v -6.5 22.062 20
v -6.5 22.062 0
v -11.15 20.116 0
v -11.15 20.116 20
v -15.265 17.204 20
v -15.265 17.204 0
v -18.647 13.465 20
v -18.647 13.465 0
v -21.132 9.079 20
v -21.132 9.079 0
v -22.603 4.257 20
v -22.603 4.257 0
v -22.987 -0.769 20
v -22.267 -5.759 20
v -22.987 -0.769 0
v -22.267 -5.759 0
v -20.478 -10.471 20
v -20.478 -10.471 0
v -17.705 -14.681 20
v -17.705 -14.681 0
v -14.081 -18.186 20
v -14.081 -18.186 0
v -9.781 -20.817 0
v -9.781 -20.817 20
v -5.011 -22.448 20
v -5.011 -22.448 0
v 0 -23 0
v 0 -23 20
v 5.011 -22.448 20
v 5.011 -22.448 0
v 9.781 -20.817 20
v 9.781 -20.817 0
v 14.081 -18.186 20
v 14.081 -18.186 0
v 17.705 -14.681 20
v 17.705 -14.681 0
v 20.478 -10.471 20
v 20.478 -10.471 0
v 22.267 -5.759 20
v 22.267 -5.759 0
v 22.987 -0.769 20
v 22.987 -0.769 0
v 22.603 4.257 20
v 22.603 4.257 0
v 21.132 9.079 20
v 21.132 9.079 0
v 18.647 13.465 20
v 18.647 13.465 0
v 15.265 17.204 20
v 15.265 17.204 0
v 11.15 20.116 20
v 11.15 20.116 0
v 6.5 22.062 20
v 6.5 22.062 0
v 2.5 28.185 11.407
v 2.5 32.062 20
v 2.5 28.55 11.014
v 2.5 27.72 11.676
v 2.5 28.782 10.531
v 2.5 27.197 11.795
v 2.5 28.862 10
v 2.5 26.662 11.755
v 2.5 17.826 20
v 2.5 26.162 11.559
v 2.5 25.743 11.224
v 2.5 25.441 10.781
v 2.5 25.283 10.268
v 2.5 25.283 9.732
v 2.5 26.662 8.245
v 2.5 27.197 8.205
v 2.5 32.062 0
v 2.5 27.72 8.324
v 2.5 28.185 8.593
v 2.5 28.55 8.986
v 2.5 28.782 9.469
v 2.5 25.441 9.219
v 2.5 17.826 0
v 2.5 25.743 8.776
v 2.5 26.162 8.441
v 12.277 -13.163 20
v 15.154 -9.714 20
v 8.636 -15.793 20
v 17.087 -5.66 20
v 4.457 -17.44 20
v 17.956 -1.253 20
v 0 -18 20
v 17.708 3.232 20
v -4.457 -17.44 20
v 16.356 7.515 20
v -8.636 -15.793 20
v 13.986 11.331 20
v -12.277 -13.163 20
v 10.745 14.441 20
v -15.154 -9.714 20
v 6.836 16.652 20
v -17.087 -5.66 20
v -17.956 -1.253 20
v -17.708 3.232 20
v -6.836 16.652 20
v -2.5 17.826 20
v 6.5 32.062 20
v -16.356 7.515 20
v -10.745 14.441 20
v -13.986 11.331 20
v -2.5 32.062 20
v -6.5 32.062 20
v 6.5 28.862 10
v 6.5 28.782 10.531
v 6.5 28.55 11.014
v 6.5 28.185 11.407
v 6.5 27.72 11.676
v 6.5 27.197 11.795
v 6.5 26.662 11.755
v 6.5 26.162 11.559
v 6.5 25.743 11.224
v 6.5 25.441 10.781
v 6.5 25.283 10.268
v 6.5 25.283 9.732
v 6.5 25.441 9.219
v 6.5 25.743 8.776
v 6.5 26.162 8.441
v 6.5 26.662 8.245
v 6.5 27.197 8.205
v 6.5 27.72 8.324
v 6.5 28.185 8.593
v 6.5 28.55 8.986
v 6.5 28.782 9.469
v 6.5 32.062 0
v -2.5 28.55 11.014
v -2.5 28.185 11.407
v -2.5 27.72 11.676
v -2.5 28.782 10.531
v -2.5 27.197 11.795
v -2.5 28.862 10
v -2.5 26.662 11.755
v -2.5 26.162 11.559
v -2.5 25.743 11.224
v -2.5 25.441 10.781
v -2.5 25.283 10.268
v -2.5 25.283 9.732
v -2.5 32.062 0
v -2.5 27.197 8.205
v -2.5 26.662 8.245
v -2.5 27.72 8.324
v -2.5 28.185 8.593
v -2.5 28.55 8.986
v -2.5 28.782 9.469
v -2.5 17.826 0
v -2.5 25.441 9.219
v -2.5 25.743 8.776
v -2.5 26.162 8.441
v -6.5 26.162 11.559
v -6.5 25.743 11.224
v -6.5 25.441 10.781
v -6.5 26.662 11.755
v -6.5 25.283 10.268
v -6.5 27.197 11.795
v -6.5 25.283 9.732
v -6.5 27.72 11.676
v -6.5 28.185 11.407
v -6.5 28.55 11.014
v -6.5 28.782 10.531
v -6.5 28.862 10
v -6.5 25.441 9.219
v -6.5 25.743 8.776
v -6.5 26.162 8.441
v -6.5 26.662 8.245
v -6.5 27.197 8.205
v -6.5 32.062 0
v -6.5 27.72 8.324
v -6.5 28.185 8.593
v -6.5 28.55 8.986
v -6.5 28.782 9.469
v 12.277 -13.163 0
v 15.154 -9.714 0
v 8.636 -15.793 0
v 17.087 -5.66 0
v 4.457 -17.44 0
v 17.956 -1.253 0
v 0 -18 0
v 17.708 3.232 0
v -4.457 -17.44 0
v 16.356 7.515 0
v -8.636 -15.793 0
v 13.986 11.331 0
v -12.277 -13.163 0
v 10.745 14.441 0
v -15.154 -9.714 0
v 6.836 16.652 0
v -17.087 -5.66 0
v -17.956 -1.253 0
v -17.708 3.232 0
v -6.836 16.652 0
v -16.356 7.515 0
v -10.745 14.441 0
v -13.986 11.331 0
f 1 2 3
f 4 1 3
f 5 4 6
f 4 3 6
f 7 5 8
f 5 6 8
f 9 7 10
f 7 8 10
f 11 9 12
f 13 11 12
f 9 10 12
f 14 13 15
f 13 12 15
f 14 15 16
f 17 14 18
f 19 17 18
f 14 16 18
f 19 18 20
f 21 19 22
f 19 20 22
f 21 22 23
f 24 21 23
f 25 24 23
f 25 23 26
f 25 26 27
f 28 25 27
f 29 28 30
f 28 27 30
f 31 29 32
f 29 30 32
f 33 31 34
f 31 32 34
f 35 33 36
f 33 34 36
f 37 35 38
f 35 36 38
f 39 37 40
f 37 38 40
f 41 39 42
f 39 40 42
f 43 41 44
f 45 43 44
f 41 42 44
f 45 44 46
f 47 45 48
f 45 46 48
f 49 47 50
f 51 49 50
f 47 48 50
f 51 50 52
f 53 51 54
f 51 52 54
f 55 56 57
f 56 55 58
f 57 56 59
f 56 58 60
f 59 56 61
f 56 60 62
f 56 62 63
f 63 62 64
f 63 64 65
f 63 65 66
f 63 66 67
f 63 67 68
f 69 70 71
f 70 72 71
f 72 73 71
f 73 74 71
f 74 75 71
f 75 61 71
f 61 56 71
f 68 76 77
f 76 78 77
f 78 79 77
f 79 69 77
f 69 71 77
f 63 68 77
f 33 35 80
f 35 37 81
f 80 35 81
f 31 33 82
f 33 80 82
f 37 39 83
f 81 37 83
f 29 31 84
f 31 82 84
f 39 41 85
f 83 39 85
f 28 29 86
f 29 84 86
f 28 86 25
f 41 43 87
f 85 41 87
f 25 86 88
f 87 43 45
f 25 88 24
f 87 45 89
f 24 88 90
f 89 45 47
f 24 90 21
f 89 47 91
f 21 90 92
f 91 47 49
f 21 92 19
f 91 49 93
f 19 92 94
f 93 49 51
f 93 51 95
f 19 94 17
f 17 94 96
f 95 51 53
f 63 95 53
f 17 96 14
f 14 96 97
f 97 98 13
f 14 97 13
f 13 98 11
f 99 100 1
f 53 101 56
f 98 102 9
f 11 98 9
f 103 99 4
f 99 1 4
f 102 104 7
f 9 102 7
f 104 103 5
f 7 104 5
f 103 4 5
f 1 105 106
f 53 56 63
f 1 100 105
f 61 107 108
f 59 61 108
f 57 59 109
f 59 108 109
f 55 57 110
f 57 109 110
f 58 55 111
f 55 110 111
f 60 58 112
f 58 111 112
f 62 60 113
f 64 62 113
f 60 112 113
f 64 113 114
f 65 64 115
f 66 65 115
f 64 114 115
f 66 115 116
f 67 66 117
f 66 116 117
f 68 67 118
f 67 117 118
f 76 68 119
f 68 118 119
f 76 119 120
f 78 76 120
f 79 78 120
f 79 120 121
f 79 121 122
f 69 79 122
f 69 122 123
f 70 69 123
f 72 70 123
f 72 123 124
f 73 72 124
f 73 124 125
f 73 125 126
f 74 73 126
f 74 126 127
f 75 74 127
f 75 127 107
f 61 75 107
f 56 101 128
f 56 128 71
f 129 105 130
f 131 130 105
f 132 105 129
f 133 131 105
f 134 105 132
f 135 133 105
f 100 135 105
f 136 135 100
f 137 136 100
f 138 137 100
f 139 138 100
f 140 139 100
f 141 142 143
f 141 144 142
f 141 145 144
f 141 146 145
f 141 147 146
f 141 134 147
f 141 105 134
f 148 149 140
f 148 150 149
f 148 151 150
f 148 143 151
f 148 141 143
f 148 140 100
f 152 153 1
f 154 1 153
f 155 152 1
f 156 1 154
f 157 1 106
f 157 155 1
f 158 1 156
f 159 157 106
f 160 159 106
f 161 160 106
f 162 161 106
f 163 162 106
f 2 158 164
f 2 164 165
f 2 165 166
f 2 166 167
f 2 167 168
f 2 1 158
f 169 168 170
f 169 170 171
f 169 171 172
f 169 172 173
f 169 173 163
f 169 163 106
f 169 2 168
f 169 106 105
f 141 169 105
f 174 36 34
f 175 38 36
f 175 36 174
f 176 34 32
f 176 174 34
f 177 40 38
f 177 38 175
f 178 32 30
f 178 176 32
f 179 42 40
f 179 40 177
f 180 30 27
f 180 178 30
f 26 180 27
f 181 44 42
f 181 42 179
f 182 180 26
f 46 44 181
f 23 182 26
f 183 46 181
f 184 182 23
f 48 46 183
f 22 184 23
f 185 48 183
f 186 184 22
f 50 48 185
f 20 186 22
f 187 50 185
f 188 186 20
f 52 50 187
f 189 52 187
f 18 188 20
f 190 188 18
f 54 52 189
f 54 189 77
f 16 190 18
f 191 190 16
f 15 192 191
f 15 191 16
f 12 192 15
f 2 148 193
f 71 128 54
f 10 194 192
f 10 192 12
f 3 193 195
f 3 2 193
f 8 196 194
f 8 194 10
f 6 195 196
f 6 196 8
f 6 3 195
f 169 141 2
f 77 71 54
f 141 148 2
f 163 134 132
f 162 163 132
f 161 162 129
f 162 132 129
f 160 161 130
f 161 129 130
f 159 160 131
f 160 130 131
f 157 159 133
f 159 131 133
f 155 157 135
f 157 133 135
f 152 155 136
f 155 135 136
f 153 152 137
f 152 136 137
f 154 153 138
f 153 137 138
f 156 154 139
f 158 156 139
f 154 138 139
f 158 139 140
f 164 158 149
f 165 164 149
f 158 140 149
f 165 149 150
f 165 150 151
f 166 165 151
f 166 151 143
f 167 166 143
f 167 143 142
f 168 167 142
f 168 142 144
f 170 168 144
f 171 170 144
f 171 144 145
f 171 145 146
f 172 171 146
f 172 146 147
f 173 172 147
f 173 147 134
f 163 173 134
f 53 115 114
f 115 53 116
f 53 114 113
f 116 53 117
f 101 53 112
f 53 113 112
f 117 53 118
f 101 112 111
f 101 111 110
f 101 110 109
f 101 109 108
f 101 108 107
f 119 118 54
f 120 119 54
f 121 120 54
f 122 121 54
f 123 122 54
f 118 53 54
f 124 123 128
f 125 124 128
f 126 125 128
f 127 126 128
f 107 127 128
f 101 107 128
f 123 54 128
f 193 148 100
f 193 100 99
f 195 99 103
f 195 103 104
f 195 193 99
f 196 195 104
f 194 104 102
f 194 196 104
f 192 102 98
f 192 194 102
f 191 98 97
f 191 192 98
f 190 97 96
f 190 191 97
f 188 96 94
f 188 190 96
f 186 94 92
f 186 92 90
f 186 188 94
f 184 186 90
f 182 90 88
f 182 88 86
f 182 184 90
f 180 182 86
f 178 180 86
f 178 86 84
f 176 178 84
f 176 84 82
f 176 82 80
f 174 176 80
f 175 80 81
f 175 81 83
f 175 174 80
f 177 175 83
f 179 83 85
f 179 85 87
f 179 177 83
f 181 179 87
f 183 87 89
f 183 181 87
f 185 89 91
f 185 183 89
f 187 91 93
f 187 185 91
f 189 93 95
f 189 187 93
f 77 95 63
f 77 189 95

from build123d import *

# Parameters (mm, degrees)
PAD_DEPTH    = 20
SKETCH001_R  = 1.8
POCKET_DEPTH = 29.501


with BuildPart() as part:
    # Sketch → Pad (new body)
    with BuildSketch(Plane.XY):
        with BuildLine():
            ThreePointArc((-2.5, 17.825543), (0, -18), (2.5, 17.825543))
            Line((2.5, 32.062411), (2.5, 17.825543))
            Line((6.5, 32.062411), (2.5, 32.062411))
            Line((6.5, 22.062411), (6.5, 32.062411))
            ThreePointArc((-6.5, 22.062411), (0, -23), (6.5, 22.062411))
            Line((-6.5, 22.062411), (-6.5, 32.062411))
            Line((-6.5, 32.062411), (-2.5, 32.062411))
            Line((-2.5, 32.062411), (-2.5, 17.825543))
        make_face()
    extrude(amount=PAD_DEPTH)

    # Sketch001 → Pocket (cut, through all)
    with BuildSketch(Plane.YZ.offset(6.5)):
        with Locations((27.062411, 10)):
            Circle(SKETCH001_R)
    extrude(amount=-POCKET_DEPTH, mode=Mode.SUBTRACT)


solid = part.part
